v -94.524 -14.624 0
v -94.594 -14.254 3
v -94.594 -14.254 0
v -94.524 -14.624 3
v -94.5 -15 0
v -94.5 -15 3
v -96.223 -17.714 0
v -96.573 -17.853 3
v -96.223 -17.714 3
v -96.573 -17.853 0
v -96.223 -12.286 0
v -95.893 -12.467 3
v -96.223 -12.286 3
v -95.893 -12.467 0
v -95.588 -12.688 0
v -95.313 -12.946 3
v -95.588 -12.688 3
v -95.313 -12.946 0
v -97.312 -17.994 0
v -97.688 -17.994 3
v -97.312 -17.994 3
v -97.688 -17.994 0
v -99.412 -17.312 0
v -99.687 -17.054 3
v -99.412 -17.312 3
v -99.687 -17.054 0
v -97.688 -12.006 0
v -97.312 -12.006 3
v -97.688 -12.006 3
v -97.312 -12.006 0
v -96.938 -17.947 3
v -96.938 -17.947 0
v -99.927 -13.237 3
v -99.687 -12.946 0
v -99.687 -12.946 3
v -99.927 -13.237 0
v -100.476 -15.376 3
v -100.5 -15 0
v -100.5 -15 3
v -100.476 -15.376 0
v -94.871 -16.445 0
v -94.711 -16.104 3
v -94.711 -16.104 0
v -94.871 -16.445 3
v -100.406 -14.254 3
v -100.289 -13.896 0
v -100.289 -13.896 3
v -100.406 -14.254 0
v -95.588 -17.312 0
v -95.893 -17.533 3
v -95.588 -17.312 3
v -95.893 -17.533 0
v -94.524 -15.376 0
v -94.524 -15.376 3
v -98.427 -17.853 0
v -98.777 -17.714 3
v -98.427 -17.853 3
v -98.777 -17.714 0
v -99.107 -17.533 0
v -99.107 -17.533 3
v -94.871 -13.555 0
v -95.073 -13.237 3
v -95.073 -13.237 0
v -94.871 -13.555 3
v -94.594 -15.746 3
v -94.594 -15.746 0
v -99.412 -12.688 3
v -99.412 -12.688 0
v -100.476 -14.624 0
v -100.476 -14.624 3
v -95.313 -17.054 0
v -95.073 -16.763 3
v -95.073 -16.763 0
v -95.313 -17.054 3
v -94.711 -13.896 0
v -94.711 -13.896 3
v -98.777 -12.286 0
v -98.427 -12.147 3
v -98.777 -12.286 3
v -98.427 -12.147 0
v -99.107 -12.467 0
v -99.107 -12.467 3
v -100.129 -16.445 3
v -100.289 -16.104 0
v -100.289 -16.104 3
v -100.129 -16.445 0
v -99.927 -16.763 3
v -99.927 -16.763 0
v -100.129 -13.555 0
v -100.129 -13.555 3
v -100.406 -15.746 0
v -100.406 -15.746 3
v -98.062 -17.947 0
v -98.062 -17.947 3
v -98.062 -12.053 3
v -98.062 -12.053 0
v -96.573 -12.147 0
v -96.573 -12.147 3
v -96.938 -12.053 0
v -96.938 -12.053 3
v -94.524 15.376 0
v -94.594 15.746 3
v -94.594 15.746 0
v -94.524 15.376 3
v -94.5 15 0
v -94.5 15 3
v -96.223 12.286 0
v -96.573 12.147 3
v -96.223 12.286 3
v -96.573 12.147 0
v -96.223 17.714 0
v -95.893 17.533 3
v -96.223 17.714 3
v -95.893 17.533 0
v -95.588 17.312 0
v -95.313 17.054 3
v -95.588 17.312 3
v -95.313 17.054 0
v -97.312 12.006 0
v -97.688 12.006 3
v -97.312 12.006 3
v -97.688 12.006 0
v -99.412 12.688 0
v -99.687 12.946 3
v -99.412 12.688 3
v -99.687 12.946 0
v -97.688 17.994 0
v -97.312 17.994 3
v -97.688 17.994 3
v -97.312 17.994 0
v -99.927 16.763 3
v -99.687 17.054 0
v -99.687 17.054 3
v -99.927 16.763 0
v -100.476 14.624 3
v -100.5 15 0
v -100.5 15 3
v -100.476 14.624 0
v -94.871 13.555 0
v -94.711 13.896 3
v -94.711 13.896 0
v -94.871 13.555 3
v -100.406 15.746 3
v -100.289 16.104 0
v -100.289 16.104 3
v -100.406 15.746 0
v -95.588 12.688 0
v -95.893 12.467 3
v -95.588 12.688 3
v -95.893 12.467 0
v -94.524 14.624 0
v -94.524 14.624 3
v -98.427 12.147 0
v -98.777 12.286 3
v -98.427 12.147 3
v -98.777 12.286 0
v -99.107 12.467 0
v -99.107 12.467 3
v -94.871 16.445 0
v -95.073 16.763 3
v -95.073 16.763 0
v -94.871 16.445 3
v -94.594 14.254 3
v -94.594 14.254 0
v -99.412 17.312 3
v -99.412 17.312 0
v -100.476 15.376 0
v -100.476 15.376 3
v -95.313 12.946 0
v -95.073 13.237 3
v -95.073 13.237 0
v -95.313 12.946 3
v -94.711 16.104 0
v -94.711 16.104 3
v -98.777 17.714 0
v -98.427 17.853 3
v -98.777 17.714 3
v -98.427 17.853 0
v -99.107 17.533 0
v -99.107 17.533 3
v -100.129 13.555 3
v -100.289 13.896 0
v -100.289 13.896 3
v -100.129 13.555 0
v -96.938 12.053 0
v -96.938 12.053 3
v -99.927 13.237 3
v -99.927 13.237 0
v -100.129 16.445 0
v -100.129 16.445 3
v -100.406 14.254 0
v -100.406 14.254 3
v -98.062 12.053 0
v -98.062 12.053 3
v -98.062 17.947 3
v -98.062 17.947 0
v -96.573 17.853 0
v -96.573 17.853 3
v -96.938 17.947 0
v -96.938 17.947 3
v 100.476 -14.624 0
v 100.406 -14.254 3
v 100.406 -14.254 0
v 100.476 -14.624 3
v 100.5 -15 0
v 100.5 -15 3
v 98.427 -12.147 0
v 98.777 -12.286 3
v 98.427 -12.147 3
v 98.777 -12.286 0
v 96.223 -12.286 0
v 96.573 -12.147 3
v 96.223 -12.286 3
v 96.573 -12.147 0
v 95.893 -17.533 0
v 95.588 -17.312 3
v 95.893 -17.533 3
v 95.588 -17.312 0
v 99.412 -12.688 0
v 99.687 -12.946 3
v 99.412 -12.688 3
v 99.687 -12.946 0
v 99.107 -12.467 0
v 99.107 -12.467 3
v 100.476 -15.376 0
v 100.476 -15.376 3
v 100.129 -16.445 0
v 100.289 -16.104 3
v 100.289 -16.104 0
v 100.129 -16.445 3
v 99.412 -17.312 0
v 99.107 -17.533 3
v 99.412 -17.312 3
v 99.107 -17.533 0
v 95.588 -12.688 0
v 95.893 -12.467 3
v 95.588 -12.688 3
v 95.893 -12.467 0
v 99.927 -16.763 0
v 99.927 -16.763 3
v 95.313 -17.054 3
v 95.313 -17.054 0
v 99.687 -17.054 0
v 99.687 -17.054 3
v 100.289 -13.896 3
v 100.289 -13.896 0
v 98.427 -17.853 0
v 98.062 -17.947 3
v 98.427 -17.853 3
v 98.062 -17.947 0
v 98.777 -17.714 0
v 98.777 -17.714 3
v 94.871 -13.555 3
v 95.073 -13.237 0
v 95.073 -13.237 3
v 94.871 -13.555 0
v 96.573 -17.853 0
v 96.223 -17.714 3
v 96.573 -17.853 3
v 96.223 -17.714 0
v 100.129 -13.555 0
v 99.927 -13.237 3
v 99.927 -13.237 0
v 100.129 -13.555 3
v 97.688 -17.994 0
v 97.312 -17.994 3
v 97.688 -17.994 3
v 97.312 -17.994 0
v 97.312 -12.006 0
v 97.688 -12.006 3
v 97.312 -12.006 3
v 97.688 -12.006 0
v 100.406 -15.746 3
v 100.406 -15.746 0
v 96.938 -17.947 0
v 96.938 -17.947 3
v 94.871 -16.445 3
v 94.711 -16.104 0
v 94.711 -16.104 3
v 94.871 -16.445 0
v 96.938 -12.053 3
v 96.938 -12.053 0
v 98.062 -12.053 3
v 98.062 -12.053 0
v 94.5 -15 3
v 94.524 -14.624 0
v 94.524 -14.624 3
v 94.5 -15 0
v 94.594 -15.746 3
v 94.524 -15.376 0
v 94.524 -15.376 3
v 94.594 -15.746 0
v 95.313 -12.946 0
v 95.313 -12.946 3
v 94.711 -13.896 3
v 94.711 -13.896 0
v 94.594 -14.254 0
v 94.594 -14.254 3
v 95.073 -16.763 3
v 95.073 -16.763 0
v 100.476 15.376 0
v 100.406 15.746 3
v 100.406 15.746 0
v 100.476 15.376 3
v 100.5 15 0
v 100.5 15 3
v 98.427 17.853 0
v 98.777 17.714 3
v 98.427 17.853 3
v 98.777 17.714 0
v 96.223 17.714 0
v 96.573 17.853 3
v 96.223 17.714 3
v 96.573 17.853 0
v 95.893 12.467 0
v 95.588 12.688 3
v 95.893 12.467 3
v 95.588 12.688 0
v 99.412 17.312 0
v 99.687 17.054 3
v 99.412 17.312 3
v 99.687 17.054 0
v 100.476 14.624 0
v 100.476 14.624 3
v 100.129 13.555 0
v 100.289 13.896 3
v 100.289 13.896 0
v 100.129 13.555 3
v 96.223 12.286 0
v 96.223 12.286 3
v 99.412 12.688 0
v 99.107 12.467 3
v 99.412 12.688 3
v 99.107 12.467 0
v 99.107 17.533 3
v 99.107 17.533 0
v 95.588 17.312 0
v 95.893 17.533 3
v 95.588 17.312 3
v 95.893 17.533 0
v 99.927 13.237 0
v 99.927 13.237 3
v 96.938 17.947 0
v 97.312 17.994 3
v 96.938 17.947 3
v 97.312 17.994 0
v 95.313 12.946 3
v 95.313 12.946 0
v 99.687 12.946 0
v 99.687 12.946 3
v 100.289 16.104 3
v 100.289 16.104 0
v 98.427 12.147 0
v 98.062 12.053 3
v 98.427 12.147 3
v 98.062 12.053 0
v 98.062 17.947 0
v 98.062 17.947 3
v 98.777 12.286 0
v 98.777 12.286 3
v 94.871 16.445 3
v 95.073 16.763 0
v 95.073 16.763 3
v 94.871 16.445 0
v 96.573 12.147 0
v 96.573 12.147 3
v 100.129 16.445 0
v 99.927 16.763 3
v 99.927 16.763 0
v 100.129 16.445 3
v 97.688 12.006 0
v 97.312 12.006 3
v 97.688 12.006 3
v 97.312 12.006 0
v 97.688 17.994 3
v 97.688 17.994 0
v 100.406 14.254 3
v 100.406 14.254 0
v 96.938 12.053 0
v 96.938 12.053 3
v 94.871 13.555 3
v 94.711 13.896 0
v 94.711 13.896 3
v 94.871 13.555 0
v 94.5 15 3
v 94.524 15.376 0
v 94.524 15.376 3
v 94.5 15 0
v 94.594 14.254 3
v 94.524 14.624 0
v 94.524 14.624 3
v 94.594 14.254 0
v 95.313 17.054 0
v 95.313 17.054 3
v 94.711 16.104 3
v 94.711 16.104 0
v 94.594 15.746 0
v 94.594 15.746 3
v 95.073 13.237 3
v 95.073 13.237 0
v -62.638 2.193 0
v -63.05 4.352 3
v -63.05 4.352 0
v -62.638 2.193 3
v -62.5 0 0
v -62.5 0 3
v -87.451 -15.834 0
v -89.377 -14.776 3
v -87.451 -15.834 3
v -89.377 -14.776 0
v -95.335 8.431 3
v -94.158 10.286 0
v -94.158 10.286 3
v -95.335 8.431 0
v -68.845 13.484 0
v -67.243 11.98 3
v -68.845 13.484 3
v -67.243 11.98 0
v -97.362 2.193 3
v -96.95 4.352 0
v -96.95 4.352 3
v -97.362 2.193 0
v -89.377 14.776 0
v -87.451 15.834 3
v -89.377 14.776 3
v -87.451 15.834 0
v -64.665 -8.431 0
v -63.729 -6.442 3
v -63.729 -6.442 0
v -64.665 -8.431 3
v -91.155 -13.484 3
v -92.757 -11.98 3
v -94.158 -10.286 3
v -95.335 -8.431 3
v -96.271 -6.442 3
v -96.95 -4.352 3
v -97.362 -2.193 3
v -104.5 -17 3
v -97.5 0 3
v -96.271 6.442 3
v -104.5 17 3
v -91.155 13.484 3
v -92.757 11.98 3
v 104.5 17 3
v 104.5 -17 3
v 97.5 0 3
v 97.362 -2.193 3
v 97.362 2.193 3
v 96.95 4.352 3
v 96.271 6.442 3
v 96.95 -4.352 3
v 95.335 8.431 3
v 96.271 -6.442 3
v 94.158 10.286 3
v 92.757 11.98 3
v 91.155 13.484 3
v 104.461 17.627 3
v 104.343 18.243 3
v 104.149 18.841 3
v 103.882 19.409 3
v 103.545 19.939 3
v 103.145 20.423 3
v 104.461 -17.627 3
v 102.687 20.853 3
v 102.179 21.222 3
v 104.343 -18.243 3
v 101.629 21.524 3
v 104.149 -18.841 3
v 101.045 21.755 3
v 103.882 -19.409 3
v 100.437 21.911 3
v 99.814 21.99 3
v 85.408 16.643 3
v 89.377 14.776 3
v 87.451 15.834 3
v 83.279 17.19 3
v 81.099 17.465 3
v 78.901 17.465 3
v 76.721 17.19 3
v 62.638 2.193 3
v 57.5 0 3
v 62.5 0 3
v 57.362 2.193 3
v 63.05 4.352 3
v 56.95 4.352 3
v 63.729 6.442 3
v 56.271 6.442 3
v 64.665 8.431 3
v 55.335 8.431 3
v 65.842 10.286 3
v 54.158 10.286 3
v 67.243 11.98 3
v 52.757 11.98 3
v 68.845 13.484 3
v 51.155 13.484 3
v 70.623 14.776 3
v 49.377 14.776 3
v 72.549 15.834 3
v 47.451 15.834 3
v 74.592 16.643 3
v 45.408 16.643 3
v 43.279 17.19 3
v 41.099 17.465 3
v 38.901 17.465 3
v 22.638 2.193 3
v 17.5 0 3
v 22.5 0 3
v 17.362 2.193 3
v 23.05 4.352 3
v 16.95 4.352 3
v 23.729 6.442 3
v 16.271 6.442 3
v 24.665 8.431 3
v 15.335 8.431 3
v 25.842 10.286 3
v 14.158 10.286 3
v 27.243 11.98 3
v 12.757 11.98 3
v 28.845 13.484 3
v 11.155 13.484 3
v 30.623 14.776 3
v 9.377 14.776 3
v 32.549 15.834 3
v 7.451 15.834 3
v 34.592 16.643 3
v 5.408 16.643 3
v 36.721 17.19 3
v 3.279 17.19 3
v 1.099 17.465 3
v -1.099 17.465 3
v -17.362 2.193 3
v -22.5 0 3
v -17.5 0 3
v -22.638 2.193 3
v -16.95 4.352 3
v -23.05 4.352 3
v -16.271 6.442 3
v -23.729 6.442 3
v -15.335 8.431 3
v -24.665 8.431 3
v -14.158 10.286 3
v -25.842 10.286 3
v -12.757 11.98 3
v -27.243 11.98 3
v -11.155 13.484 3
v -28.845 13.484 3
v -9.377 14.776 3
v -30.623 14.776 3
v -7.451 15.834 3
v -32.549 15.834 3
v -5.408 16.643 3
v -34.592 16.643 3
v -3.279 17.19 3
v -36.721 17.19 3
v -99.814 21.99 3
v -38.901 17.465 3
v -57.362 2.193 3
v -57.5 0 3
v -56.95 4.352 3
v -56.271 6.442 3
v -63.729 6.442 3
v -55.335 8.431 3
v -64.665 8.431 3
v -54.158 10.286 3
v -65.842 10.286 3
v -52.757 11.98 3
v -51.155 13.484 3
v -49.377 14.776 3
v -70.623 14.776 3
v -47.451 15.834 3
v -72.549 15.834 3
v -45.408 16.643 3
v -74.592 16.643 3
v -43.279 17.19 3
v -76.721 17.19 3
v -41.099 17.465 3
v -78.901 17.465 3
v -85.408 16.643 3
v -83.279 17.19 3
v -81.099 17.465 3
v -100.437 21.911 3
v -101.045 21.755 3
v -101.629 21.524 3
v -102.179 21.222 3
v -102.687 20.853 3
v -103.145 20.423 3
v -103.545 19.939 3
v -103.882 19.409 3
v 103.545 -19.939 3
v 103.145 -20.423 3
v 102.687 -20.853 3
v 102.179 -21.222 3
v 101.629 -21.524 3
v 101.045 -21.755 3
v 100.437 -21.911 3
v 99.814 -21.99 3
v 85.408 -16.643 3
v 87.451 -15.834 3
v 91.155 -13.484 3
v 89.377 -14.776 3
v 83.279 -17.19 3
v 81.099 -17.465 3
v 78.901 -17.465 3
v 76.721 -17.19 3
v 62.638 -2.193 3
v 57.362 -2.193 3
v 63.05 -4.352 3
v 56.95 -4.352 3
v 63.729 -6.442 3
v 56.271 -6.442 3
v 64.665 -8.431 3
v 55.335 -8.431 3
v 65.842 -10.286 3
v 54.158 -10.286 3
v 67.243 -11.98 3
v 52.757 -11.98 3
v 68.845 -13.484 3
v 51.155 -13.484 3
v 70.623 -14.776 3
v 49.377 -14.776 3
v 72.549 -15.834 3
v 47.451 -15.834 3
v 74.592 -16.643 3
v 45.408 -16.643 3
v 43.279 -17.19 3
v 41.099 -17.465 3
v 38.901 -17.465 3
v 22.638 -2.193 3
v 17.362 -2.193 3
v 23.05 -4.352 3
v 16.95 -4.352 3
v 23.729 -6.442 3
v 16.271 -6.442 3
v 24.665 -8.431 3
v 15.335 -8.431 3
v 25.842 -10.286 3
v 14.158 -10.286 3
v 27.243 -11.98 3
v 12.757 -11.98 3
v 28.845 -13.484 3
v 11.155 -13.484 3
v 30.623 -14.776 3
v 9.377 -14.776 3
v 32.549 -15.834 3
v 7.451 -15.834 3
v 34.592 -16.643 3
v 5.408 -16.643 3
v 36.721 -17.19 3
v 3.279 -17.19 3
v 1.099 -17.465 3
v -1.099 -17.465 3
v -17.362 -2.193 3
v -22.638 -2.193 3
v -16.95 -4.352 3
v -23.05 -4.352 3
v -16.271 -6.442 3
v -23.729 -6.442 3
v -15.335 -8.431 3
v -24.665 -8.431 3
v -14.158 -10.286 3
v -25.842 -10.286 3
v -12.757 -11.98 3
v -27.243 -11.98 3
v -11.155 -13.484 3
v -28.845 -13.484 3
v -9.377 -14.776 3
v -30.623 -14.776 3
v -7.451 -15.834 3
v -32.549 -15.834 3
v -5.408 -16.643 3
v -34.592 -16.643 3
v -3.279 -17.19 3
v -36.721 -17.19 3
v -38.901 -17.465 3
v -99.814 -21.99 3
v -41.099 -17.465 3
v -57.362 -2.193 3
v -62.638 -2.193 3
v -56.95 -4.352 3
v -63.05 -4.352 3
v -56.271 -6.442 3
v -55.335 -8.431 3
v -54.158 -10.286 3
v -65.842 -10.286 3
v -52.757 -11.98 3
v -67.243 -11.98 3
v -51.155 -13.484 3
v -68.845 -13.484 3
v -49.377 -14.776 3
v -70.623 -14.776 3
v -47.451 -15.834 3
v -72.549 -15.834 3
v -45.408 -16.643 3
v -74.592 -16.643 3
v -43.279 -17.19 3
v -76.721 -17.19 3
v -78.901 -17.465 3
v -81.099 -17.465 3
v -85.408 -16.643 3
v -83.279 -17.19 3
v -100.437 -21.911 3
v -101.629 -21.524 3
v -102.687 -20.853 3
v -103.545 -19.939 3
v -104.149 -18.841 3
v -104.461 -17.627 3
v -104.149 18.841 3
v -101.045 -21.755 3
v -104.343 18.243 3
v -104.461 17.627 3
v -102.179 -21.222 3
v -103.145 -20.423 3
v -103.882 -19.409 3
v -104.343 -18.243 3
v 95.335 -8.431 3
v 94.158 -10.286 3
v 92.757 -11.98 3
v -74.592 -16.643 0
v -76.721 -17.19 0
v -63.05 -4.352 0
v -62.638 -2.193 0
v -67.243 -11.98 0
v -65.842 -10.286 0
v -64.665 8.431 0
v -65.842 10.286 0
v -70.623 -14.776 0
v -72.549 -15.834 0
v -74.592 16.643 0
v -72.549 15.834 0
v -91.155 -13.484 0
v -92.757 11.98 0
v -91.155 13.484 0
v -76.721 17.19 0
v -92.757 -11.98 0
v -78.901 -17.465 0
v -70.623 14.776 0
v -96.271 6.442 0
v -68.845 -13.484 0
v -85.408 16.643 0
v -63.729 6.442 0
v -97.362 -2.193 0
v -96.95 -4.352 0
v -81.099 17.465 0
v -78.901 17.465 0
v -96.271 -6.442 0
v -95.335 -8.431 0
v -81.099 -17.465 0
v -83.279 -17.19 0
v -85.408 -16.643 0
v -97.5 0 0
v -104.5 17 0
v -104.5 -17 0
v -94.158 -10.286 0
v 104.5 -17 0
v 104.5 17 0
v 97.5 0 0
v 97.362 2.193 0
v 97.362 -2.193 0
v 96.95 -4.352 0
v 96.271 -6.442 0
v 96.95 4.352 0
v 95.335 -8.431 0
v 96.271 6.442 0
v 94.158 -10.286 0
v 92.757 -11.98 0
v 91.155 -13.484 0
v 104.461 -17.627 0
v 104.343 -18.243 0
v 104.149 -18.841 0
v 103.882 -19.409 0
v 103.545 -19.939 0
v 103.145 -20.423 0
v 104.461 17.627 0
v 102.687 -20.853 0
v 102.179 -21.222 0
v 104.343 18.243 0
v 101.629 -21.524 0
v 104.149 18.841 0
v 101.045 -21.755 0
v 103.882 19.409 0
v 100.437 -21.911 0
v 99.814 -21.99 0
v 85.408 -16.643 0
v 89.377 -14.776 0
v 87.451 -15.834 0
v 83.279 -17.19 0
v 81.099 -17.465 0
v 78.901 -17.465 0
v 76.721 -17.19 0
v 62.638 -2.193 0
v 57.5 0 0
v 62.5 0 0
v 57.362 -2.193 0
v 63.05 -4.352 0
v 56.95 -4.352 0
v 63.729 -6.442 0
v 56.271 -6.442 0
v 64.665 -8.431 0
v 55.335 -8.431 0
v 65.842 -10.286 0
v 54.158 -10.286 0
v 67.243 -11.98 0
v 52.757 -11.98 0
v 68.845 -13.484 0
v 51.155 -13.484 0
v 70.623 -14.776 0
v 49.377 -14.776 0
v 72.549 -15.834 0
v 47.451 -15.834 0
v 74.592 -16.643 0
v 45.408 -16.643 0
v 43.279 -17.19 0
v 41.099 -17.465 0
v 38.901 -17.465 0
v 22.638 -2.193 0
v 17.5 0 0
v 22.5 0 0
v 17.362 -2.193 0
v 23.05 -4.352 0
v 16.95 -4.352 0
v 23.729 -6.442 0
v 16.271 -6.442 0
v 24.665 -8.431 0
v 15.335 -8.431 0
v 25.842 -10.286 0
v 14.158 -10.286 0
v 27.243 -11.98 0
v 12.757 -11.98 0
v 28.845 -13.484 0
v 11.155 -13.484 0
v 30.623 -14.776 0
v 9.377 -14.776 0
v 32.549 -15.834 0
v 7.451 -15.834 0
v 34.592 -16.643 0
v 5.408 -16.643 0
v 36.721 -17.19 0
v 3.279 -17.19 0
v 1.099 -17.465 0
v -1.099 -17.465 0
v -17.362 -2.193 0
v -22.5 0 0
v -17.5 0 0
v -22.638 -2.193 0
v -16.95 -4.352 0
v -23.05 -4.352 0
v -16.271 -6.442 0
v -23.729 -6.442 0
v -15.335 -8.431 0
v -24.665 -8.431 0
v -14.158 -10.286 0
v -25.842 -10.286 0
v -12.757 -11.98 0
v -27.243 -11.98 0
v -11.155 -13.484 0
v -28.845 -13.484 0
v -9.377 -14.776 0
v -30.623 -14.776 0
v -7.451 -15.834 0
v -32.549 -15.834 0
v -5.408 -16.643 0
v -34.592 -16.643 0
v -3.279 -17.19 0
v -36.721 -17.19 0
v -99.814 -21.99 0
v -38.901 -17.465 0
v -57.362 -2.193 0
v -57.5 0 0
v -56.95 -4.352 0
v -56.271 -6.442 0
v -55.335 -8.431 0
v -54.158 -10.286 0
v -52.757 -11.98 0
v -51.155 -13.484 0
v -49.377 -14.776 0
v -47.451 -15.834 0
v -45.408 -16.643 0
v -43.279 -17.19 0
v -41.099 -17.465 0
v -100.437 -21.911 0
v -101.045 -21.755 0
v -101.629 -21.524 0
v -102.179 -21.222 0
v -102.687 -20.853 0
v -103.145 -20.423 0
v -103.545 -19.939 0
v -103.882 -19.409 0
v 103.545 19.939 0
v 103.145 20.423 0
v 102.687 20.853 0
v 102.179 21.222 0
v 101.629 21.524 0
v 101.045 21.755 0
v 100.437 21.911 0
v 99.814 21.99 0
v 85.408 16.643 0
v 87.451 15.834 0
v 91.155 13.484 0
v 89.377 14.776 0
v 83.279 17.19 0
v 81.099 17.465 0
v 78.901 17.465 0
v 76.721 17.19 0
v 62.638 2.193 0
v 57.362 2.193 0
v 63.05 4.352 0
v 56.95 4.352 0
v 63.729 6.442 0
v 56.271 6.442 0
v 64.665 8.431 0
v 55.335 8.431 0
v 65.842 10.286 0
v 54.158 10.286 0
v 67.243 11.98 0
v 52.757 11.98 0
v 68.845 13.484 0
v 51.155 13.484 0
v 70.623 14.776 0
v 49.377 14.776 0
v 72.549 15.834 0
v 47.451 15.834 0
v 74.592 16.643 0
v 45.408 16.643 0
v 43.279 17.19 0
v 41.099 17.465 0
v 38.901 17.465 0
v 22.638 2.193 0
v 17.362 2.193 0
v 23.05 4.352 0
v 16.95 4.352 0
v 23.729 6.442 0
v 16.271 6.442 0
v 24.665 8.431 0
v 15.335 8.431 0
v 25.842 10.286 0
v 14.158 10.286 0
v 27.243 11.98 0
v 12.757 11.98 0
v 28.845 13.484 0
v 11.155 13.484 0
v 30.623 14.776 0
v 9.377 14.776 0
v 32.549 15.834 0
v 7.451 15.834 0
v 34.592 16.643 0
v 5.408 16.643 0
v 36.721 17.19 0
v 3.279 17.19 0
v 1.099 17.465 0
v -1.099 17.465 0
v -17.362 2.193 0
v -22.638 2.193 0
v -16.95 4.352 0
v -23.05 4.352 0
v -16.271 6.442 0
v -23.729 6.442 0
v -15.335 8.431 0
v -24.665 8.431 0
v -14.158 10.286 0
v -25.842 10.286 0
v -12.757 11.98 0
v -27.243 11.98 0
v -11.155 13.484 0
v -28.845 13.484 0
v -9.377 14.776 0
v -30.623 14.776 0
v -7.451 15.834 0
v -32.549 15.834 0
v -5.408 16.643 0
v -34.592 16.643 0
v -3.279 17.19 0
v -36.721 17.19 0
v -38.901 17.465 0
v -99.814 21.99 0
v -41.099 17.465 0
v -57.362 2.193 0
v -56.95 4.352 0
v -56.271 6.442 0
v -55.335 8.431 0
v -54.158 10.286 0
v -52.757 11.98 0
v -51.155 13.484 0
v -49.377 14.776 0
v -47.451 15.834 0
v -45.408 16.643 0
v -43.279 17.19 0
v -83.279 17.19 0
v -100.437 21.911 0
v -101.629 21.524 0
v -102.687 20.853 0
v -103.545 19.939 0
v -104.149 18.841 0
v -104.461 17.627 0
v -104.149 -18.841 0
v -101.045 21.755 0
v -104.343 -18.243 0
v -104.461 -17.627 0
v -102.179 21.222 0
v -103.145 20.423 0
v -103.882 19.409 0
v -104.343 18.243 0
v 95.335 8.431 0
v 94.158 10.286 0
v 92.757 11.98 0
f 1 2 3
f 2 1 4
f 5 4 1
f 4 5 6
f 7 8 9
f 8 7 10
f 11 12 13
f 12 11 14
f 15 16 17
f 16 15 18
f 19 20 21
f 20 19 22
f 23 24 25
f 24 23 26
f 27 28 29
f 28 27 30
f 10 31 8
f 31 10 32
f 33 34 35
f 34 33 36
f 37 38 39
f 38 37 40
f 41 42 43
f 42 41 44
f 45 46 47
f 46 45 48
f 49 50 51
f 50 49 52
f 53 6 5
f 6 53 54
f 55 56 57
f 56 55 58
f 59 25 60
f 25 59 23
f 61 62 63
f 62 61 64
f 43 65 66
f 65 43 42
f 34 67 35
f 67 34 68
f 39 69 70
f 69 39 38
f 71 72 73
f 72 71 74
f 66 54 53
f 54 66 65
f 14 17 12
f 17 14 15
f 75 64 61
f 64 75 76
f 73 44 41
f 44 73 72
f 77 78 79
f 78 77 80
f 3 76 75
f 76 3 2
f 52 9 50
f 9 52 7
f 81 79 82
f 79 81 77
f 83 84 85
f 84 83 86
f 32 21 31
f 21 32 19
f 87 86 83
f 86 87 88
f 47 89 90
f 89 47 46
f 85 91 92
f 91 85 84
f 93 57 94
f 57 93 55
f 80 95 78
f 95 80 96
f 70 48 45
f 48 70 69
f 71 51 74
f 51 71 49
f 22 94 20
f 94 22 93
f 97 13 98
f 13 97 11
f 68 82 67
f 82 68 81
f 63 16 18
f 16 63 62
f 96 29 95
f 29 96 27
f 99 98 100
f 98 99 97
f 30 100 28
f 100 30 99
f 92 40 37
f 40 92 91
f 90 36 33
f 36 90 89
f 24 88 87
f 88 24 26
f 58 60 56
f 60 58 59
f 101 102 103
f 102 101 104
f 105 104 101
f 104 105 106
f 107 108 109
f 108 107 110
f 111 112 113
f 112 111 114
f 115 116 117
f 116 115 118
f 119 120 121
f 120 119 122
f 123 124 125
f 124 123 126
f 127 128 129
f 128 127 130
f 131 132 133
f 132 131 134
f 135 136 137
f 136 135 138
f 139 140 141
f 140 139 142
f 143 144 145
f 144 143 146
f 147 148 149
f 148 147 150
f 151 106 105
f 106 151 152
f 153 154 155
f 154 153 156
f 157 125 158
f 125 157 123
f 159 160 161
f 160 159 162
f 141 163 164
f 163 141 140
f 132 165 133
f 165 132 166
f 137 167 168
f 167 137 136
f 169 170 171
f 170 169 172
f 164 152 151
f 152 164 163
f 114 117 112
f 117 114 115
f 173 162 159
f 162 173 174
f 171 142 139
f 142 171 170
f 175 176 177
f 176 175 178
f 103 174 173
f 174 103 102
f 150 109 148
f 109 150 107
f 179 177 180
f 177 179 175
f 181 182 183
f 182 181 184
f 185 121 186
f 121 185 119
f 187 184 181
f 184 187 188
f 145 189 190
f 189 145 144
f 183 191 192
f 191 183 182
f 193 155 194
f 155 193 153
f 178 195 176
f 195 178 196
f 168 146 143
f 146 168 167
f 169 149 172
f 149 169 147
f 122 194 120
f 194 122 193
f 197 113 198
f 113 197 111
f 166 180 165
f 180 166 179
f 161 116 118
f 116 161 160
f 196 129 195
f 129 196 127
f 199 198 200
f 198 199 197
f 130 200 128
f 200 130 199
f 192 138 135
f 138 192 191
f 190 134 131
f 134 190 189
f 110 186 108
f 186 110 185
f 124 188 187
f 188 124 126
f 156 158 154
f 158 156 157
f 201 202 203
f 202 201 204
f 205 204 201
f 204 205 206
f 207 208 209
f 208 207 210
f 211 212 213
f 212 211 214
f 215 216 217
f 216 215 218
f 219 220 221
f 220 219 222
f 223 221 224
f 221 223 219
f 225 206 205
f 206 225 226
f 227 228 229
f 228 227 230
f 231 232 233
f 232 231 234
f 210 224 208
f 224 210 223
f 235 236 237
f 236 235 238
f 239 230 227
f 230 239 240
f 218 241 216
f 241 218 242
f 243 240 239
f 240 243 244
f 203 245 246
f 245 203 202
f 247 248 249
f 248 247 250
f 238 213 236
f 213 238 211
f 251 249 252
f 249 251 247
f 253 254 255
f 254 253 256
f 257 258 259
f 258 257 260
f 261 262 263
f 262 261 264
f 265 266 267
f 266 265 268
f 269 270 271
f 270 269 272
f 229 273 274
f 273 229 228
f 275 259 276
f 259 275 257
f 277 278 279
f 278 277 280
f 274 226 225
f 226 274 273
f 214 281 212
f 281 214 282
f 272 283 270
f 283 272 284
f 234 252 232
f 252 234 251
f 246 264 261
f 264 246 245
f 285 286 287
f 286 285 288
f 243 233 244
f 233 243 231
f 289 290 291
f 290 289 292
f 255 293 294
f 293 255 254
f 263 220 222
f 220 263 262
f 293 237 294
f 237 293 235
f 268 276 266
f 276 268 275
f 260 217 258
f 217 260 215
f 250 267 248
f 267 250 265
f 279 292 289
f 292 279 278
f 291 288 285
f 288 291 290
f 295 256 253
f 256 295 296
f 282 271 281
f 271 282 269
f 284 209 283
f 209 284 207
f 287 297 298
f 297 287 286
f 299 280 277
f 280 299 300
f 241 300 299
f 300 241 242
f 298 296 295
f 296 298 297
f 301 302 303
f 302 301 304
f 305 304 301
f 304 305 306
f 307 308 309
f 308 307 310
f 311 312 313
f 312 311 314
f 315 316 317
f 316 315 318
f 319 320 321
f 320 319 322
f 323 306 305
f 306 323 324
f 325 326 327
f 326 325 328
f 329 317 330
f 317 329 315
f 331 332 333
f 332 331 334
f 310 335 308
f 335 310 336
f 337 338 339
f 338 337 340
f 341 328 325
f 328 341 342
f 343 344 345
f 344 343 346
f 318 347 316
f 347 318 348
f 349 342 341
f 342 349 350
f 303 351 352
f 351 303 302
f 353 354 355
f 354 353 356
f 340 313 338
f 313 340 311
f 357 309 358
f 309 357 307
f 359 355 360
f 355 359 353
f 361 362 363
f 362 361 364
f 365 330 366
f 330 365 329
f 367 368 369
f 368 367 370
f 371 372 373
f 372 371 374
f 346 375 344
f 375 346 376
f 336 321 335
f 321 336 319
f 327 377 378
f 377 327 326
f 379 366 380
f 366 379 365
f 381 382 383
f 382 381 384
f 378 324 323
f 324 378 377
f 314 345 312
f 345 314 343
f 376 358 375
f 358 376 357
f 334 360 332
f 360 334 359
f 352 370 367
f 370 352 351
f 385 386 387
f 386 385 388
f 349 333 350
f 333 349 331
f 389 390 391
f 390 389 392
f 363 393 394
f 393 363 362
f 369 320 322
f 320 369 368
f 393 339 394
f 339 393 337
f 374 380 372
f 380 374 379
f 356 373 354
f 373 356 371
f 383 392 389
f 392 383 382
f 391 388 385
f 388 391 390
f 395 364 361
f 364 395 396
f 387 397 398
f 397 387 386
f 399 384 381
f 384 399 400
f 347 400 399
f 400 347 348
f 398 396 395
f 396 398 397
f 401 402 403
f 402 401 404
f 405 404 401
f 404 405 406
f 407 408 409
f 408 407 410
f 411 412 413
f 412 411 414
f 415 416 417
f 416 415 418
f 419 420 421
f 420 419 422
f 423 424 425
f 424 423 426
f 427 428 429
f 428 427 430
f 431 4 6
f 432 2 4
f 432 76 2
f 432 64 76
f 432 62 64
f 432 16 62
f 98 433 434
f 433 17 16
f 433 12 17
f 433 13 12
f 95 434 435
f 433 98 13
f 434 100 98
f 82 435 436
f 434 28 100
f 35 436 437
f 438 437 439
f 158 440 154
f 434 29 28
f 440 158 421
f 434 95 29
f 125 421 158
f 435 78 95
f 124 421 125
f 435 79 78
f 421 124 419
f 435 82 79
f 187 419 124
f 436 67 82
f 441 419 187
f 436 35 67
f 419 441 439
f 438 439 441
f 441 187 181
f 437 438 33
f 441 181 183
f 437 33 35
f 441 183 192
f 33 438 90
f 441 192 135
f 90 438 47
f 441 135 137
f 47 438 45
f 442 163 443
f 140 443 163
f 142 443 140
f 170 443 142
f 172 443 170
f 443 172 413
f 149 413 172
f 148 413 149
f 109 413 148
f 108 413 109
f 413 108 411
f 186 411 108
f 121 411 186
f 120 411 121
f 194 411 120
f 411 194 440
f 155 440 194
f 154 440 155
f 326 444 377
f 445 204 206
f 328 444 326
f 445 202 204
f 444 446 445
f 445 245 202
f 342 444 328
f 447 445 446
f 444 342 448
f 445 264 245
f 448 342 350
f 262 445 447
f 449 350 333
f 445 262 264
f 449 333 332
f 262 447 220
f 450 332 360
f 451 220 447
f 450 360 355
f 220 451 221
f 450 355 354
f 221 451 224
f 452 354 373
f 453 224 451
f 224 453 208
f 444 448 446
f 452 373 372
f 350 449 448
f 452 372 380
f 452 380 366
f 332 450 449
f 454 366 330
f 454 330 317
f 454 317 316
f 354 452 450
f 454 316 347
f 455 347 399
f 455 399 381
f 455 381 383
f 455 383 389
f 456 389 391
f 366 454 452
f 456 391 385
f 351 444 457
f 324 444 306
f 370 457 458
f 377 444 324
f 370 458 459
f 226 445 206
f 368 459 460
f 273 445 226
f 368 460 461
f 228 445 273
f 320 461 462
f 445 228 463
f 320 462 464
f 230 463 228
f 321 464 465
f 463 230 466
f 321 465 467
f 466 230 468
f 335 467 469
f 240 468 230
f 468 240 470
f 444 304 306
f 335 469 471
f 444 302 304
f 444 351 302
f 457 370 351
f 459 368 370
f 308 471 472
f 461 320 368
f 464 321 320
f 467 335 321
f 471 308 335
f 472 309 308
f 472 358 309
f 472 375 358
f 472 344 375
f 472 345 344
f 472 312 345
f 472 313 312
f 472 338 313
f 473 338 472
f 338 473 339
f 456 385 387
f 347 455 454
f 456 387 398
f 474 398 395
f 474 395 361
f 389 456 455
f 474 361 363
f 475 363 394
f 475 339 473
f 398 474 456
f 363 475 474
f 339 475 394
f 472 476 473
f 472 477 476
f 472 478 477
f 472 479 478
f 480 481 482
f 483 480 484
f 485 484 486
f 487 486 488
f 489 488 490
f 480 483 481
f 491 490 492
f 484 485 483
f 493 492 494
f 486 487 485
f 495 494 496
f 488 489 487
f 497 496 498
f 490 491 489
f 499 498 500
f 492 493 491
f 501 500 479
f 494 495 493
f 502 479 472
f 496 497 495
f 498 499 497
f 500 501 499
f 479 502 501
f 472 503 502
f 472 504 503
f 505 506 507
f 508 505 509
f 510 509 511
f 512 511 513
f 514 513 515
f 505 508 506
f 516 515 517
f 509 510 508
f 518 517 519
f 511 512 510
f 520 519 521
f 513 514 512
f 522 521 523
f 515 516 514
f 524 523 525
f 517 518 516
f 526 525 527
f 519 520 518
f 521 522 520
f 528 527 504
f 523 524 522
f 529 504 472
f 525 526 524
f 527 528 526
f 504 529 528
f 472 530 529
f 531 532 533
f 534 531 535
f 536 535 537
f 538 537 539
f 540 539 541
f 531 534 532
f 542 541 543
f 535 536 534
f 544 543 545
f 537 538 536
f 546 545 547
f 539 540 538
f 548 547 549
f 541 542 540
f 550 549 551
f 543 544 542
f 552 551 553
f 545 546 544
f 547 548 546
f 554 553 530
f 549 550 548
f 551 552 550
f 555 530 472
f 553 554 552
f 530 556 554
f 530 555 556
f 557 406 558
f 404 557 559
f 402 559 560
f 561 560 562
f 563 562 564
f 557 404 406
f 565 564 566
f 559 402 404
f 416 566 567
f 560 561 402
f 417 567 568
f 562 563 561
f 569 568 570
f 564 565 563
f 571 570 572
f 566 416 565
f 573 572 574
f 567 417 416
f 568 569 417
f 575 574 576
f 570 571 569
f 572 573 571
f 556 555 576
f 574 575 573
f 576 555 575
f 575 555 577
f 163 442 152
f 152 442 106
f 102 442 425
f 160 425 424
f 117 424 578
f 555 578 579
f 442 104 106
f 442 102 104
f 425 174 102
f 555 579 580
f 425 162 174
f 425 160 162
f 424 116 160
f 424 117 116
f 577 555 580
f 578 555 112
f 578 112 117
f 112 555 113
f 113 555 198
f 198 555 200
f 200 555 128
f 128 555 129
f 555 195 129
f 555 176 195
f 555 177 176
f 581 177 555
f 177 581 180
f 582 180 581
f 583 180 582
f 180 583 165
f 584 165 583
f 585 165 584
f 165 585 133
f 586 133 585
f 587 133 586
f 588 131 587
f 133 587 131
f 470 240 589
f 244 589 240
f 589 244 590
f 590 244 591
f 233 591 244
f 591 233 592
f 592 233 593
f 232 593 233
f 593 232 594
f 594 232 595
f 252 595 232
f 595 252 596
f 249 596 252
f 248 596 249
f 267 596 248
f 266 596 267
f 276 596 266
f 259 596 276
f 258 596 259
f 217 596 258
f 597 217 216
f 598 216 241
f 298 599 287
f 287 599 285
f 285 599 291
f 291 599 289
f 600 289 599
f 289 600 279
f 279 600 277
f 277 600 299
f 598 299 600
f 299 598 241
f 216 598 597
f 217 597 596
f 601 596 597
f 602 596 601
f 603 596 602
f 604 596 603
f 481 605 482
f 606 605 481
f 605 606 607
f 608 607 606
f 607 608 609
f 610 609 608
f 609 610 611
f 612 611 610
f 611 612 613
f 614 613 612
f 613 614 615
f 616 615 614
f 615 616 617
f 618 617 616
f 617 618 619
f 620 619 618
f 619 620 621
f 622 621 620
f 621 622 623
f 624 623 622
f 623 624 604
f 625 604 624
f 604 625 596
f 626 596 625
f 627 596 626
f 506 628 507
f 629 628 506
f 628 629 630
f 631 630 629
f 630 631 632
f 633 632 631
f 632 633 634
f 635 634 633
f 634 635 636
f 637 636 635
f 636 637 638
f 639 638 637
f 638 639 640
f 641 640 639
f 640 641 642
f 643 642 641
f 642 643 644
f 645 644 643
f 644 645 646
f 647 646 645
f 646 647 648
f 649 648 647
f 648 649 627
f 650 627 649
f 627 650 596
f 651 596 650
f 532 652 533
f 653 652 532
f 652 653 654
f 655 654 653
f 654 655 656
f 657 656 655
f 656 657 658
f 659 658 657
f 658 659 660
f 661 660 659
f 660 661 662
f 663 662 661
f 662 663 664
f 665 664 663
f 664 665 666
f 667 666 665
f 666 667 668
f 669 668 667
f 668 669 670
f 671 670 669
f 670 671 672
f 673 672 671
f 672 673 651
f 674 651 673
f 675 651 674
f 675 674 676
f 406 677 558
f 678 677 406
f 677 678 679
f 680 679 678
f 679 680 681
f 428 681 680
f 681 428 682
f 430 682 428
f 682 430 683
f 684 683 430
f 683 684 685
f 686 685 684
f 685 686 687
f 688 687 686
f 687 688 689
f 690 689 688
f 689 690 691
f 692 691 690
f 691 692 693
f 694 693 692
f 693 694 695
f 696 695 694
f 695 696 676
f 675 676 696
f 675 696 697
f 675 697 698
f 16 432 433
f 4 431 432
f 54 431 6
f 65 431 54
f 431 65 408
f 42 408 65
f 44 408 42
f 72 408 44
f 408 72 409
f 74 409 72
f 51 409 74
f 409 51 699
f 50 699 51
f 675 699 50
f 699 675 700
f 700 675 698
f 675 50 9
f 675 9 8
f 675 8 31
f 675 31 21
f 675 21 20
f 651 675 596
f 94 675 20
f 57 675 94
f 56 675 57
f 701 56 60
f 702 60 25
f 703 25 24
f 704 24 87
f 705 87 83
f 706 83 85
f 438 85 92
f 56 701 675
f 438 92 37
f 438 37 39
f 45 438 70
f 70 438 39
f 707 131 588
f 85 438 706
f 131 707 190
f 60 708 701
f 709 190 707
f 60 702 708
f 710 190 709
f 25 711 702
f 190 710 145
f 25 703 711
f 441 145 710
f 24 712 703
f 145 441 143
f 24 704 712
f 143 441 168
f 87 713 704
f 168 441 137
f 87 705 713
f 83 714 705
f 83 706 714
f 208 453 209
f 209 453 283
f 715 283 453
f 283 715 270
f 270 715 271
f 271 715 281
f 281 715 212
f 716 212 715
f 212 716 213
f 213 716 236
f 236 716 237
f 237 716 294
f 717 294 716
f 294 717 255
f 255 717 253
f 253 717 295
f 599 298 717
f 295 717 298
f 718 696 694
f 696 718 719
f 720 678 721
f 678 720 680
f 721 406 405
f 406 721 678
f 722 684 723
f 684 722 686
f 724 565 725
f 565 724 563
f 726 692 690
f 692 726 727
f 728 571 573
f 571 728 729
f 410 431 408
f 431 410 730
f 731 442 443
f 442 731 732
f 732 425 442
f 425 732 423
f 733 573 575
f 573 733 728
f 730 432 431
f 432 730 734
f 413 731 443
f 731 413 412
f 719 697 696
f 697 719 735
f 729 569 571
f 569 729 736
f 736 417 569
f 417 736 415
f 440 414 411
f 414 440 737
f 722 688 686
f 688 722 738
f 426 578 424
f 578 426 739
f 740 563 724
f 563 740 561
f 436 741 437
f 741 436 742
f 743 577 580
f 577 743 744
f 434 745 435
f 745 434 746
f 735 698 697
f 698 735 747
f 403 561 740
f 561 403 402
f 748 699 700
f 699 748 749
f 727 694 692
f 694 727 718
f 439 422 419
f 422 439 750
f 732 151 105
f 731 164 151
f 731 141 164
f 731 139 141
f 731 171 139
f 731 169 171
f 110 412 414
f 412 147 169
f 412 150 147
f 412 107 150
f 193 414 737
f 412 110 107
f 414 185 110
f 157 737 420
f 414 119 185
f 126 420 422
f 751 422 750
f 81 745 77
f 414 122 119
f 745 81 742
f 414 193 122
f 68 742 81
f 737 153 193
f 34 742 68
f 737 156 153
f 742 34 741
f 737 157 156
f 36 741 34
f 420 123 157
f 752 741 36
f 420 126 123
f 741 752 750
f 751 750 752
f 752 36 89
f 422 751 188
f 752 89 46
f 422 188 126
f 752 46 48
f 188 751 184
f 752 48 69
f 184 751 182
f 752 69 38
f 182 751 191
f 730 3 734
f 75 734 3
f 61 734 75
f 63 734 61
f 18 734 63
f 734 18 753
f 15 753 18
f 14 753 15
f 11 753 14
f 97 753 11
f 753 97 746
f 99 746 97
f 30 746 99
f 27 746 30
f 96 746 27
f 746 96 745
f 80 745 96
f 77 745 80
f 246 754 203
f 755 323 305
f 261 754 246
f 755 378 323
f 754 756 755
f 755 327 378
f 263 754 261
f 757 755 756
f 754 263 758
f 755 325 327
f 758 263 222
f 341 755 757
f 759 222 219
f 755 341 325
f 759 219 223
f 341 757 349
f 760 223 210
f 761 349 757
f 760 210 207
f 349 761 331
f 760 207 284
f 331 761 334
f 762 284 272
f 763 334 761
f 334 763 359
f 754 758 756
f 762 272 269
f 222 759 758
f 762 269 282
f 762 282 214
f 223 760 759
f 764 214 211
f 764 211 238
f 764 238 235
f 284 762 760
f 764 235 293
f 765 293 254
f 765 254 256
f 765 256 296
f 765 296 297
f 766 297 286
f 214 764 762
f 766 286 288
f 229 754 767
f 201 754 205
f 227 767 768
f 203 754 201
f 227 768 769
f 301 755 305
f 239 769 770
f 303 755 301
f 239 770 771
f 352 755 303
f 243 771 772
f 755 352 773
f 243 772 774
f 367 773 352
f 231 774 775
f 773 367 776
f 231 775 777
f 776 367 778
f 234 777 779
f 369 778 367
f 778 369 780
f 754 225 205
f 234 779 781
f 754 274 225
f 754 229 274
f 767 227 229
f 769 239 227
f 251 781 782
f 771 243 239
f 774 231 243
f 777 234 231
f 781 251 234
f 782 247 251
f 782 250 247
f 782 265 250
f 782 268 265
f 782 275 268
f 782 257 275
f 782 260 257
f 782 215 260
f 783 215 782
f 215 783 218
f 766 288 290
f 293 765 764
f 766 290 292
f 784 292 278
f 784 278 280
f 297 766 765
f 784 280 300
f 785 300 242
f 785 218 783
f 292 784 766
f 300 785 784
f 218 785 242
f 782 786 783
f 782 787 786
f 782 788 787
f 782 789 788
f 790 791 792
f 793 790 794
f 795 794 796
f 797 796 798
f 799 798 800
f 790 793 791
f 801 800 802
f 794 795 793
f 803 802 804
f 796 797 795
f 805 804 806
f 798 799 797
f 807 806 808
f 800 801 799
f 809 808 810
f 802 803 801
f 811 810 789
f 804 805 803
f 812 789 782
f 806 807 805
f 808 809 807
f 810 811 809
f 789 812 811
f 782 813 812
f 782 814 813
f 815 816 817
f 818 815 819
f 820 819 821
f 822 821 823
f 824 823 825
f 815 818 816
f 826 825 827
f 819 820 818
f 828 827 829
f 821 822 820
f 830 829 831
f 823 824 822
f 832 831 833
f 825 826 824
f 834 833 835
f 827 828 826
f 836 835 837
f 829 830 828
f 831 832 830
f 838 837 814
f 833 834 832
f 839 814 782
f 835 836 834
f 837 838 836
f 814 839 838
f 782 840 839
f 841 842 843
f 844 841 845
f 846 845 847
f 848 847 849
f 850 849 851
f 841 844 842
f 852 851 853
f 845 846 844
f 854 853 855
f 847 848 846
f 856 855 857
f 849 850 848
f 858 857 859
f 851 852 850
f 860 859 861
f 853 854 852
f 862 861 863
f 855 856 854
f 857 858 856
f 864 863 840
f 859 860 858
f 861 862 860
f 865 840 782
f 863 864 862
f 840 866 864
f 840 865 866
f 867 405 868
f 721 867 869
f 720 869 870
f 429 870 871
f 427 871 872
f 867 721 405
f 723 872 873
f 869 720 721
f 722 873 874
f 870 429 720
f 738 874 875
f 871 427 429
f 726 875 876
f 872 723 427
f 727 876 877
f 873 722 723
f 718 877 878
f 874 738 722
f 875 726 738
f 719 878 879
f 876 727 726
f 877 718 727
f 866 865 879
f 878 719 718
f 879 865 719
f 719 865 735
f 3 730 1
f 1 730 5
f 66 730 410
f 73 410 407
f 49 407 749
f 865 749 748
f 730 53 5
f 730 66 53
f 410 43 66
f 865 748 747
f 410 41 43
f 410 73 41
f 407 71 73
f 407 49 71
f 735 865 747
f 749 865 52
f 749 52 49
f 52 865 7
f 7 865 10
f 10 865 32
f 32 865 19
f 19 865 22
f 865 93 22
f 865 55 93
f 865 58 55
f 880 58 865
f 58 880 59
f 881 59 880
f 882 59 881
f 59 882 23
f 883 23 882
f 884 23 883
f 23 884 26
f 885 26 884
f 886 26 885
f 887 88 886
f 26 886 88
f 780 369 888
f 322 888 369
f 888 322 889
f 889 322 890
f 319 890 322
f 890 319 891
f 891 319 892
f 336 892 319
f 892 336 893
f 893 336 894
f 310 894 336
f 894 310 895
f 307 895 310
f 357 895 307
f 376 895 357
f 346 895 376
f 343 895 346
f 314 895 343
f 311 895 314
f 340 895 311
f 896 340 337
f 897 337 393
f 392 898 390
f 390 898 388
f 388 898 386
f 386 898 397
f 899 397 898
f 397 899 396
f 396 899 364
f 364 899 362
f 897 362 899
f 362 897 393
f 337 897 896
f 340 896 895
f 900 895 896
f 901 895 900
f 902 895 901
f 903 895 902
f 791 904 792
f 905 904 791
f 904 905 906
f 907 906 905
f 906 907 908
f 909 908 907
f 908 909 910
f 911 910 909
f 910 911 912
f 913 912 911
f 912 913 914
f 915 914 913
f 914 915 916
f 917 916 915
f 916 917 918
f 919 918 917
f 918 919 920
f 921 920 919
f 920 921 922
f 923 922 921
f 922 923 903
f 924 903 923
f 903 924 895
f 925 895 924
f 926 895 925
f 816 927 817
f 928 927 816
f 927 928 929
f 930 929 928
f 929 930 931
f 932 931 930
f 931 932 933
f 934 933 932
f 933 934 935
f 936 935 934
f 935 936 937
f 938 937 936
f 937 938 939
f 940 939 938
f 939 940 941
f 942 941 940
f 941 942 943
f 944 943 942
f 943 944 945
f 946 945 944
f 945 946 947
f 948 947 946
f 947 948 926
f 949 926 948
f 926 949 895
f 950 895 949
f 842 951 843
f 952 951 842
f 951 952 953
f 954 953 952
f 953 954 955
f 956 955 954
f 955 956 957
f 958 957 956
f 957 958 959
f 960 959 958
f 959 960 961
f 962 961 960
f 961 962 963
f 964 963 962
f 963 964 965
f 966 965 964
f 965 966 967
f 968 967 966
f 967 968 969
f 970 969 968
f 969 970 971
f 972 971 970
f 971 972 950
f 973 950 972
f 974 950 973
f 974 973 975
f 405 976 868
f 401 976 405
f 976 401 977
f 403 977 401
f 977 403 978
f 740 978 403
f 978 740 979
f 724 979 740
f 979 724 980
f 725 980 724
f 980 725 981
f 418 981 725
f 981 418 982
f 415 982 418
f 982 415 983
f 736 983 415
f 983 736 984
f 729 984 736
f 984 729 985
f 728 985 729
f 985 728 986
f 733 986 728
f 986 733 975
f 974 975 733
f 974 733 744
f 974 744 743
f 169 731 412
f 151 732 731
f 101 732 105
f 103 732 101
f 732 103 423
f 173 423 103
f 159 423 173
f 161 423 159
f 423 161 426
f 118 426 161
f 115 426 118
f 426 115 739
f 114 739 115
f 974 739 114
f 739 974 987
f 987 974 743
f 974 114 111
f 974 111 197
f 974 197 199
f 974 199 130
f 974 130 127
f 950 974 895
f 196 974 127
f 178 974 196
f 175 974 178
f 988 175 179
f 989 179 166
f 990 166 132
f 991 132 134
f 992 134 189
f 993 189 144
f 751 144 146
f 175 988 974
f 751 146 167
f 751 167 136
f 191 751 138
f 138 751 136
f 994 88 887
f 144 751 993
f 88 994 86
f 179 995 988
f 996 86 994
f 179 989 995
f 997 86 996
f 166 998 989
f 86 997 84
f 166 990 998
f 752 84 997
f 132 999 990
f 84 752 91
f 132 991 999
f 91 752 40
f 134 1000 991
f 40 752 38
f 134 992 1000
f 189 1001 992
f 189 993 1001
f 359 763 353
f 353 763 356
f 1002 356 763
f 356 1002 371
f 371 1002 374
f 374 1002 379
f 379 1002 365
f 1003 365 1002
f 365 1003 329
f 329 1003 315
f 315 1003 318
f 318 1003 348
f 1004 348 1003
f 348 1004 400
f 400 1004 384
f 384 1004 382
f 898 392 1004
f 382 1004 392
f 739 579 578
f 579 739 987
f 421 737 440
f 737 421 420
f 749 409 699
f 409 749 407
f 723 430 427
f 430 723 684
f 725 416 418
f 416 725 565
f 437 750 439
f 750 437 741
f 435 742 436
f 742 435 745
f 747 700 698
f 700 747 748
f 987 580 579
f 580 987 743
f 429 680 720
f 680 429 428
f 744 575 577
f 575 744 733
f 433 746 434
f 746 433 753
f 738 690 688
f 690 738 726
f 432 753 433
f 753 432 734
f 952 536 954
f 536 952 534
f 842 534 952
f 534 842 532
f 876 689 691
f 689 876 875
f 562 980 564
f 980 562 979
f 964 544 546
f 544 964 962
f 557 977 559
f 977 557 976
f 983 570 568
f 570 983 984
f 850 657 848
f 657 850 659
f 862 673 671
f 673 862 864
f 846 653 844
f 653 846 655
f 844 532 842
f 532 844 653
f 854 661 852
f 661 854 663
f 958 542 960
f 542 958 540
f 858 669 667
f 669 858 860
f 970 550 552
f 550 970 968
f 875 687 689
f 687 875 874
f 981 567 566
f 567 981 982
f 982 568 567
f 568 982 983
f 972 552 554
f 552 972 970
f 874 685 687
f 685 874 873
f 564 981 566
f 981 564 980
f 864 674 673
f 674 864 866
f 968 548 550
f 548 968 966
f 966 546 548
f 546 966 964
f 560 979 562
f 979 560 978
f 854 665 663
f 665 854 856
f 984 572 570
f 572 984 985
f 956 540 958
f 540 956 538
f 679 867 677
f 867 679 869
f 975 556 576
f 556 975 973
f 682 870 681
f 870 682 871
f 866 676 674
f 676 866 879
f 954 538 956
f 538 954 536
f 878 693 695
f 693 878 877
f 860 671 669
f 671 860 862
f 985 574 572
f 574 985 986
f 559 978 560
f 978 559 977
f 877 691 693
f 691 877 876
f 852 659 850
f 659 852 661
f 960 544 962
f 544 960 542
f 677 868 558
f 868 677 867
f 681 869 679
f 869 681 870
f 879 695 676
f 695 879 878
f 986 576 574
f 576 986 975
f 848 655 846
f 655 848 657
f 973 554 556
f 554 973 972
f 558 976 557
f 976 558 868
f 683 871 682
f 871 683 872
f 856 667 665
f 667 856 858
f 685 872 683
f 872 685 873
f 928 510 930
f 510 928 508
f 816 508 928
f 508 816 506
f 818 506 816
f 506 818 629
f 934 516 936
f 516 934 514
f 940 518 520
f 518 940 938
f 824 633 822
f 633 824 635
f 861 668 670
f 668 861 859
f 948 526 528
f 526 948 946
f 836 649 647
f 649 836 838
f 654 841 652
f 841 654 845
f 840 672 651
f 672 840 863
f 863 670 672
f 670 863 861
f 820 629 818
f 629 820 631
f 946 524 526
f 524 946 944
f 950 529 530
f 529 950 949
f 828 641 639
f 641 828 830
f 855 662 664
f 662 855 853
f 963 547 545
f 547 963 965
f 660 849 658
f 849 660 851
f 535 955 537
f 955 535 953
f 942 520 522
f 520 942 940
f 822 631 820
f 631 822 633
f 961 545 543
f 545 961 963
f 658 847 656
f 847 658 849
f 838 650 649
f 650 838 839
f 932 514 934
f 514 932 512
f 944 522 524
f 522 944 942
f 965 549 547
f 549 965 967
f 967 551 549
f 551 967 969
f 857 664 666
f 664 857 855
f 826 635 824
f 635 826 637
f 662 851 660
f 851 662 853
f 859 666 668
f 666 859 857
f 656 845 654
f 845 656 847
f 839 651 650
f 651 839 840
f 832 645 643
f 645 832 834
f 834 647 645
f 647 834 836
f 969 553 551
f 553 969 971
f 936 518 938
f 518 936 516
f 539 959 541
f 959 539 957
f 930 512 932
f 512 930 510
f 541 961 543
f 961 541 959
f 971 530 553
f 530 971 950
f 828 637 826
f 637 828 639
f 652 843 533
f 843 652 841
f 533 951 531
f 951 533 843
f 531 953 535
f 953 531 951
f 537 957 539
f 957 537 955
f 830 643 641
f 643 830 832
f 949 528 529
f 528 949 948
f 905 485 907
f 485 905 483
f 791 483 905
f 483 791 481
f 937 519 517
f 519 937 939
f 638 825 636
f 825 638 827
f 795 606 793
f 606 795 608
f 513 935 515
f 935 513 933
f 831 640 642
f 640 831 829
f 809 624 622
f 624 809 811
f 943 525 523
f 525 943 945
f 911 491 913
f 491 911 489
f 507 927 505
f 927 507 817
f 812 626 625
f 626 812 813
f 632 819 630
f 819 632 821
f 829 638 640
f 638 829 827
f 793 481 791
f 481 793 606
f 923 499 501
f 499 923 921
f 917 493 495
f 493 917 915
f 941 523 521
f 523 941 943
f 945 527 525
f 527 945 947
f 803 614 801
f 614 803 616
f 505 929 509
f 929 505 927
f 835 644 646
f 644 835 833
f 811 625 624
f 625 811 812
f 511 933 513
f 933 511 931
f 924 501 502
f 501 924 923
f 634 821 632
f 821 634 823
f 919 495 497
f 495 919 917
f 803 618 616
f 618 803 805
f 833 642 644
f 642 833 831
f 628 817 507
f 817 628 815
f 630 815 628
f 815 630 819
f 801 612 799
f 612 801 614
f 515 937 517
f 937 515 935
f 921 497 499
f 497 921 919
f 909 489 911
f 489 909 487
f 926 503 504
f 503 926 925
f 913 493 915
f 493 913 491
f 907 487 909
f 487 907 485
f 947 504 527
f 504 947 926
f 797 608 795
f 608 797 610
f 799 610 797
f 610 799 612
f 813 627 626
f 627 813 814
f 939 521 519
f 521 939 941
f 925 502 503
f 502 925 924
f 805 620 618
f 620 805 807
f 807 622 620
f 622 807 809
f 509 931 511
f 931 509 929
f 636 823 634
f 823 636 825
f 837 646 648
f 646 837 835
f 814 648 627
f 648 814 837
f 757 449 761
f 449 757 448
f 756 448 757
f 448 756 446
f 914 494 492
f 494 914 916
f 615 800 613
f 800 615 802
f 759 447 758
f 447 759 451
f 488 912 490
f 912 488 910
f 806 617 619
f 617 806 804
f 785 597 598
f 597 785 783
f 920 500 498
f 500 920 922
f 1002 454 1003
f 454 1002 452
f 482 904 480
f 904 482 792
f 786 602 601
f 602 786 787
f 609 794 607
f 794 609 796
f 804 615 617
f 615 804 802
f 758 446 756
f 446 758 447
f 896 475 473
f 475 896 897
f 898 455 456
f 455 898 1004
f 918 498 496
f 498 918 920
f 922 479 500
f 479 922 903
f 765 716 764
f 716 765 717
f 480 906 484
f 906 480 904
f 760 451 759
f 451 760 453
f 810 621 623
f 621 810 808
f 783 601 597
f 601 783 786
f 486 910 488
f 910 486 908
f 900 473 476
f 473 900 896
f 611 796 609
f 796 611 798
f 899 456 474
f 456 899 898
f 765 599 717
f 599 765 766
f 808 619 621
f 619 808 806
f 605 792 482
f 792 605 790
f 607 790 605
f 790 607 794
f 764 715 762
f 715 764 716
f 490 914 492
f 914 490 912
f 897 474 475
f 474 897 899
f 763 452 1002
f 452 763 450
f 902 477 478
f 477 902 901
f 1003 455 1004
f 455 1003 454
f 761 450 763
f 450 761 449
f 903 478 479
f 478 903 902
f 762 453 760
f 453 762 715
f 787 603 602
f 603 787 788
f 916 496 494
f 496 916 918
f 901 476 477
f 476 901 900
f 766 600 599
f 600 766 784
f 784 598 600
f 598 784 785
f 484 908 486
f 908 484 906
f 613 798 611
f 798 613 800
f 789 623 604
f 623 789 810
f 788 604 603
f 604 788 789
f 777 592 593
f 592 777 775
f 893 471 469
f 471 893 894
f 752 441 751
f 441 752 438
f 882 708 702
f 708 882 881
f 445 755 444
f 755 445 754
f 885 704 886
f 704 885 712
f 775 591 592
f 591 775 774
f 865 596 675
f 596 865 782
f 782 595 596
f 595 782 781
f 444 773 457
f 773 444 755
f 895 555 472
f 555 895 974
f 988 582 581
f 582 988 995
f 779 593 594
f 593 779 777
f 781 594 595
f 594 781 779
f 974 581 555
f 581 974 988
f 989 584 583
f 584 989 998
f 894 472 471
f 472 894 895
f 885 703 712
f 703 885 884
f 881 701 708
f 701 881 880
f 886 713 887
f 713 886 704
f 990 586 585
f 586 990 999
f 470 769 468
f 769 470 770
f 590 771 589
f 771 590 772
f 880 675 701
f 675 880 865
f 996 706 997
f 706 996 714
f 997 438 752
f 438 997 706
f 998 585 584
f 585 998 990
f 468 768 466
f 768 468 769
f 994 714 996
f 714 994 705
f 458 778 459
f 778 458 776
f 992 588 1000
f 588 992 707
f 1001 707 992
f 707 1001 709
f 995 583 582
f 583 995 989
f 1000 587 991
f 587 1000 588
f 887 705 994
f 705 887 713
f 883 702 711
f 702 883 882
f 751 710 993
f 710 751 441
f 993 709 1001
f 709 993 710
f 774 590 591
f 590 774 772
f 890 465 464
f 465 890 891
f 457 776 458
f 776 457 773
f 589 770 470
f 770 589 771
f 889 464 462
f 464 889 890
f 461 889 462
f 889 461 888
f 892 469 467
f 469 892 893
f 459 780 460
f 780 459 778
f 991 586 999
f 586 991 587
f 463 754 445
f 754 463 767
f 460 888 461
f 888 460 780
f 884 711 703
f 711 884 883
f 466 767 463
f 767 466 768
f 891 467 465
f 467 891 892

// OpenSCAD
$fn = 50;


difference() {
	union() {
		hull() {
			translate(v = [-99.5000000000, 17.0000000000, 0]) {
				cylinder(h = 3, r = 5);
			}
			translate(v = [99.5000000000, 17.0000000000, 0]) {
				cylinder(h = 3, r = 5);
			}
			translate(v = [-99.5000000000, -17.0000000000, 0]) {
				cylinder(h = 3, r = 5);
			}
			translate(v = [99.5000000000, -17.0000000000, 0]) {
				cylinder(h = 3, r = 5);
			}
		}
	}
	union() {
		#translate(v = [-97.5000000000, -15.0000000000, -100.0000000000]) {
			cylinder(h = 200, r = 3.0000000000);
		}
		#translate(v = [-97.5000000000, 15.0000000000, -100.0000000000]) {
			cylinder(h = 200, r = 3.0000000000);
		}
		#translate(v = [97.5000000000, -15.0000000000, -100.0000000000]) {
			cylinder(h = 200, r = 3.0000000000);
		}
		#translate(v = [97.5000000000, 15.0000000000, -100.0000000000]) {
			cylinder(h = 200, r = 3.0000000000);
		}
		#translate(v = [-80.0000000000, 0, 0]) {
			cylinder(h = 3, r = 17.5000000000);
		}
		#translate(v = [-40.0000000000, 0, 0]) {
			cylinder(h = 3, r = 17.5000000000);
		}
		#cylinder(h = 3, r = 17.5000000000);
		#translate(v = [40.0000000000, 0, 0]) {
			cylinder(h = 3, r = 17.5000000000);
		}
		#translate(v = [80.0000000000, 0, 0]) {
			cylinder(h = 3, r = 17.5000000000);
		}
	}
}
